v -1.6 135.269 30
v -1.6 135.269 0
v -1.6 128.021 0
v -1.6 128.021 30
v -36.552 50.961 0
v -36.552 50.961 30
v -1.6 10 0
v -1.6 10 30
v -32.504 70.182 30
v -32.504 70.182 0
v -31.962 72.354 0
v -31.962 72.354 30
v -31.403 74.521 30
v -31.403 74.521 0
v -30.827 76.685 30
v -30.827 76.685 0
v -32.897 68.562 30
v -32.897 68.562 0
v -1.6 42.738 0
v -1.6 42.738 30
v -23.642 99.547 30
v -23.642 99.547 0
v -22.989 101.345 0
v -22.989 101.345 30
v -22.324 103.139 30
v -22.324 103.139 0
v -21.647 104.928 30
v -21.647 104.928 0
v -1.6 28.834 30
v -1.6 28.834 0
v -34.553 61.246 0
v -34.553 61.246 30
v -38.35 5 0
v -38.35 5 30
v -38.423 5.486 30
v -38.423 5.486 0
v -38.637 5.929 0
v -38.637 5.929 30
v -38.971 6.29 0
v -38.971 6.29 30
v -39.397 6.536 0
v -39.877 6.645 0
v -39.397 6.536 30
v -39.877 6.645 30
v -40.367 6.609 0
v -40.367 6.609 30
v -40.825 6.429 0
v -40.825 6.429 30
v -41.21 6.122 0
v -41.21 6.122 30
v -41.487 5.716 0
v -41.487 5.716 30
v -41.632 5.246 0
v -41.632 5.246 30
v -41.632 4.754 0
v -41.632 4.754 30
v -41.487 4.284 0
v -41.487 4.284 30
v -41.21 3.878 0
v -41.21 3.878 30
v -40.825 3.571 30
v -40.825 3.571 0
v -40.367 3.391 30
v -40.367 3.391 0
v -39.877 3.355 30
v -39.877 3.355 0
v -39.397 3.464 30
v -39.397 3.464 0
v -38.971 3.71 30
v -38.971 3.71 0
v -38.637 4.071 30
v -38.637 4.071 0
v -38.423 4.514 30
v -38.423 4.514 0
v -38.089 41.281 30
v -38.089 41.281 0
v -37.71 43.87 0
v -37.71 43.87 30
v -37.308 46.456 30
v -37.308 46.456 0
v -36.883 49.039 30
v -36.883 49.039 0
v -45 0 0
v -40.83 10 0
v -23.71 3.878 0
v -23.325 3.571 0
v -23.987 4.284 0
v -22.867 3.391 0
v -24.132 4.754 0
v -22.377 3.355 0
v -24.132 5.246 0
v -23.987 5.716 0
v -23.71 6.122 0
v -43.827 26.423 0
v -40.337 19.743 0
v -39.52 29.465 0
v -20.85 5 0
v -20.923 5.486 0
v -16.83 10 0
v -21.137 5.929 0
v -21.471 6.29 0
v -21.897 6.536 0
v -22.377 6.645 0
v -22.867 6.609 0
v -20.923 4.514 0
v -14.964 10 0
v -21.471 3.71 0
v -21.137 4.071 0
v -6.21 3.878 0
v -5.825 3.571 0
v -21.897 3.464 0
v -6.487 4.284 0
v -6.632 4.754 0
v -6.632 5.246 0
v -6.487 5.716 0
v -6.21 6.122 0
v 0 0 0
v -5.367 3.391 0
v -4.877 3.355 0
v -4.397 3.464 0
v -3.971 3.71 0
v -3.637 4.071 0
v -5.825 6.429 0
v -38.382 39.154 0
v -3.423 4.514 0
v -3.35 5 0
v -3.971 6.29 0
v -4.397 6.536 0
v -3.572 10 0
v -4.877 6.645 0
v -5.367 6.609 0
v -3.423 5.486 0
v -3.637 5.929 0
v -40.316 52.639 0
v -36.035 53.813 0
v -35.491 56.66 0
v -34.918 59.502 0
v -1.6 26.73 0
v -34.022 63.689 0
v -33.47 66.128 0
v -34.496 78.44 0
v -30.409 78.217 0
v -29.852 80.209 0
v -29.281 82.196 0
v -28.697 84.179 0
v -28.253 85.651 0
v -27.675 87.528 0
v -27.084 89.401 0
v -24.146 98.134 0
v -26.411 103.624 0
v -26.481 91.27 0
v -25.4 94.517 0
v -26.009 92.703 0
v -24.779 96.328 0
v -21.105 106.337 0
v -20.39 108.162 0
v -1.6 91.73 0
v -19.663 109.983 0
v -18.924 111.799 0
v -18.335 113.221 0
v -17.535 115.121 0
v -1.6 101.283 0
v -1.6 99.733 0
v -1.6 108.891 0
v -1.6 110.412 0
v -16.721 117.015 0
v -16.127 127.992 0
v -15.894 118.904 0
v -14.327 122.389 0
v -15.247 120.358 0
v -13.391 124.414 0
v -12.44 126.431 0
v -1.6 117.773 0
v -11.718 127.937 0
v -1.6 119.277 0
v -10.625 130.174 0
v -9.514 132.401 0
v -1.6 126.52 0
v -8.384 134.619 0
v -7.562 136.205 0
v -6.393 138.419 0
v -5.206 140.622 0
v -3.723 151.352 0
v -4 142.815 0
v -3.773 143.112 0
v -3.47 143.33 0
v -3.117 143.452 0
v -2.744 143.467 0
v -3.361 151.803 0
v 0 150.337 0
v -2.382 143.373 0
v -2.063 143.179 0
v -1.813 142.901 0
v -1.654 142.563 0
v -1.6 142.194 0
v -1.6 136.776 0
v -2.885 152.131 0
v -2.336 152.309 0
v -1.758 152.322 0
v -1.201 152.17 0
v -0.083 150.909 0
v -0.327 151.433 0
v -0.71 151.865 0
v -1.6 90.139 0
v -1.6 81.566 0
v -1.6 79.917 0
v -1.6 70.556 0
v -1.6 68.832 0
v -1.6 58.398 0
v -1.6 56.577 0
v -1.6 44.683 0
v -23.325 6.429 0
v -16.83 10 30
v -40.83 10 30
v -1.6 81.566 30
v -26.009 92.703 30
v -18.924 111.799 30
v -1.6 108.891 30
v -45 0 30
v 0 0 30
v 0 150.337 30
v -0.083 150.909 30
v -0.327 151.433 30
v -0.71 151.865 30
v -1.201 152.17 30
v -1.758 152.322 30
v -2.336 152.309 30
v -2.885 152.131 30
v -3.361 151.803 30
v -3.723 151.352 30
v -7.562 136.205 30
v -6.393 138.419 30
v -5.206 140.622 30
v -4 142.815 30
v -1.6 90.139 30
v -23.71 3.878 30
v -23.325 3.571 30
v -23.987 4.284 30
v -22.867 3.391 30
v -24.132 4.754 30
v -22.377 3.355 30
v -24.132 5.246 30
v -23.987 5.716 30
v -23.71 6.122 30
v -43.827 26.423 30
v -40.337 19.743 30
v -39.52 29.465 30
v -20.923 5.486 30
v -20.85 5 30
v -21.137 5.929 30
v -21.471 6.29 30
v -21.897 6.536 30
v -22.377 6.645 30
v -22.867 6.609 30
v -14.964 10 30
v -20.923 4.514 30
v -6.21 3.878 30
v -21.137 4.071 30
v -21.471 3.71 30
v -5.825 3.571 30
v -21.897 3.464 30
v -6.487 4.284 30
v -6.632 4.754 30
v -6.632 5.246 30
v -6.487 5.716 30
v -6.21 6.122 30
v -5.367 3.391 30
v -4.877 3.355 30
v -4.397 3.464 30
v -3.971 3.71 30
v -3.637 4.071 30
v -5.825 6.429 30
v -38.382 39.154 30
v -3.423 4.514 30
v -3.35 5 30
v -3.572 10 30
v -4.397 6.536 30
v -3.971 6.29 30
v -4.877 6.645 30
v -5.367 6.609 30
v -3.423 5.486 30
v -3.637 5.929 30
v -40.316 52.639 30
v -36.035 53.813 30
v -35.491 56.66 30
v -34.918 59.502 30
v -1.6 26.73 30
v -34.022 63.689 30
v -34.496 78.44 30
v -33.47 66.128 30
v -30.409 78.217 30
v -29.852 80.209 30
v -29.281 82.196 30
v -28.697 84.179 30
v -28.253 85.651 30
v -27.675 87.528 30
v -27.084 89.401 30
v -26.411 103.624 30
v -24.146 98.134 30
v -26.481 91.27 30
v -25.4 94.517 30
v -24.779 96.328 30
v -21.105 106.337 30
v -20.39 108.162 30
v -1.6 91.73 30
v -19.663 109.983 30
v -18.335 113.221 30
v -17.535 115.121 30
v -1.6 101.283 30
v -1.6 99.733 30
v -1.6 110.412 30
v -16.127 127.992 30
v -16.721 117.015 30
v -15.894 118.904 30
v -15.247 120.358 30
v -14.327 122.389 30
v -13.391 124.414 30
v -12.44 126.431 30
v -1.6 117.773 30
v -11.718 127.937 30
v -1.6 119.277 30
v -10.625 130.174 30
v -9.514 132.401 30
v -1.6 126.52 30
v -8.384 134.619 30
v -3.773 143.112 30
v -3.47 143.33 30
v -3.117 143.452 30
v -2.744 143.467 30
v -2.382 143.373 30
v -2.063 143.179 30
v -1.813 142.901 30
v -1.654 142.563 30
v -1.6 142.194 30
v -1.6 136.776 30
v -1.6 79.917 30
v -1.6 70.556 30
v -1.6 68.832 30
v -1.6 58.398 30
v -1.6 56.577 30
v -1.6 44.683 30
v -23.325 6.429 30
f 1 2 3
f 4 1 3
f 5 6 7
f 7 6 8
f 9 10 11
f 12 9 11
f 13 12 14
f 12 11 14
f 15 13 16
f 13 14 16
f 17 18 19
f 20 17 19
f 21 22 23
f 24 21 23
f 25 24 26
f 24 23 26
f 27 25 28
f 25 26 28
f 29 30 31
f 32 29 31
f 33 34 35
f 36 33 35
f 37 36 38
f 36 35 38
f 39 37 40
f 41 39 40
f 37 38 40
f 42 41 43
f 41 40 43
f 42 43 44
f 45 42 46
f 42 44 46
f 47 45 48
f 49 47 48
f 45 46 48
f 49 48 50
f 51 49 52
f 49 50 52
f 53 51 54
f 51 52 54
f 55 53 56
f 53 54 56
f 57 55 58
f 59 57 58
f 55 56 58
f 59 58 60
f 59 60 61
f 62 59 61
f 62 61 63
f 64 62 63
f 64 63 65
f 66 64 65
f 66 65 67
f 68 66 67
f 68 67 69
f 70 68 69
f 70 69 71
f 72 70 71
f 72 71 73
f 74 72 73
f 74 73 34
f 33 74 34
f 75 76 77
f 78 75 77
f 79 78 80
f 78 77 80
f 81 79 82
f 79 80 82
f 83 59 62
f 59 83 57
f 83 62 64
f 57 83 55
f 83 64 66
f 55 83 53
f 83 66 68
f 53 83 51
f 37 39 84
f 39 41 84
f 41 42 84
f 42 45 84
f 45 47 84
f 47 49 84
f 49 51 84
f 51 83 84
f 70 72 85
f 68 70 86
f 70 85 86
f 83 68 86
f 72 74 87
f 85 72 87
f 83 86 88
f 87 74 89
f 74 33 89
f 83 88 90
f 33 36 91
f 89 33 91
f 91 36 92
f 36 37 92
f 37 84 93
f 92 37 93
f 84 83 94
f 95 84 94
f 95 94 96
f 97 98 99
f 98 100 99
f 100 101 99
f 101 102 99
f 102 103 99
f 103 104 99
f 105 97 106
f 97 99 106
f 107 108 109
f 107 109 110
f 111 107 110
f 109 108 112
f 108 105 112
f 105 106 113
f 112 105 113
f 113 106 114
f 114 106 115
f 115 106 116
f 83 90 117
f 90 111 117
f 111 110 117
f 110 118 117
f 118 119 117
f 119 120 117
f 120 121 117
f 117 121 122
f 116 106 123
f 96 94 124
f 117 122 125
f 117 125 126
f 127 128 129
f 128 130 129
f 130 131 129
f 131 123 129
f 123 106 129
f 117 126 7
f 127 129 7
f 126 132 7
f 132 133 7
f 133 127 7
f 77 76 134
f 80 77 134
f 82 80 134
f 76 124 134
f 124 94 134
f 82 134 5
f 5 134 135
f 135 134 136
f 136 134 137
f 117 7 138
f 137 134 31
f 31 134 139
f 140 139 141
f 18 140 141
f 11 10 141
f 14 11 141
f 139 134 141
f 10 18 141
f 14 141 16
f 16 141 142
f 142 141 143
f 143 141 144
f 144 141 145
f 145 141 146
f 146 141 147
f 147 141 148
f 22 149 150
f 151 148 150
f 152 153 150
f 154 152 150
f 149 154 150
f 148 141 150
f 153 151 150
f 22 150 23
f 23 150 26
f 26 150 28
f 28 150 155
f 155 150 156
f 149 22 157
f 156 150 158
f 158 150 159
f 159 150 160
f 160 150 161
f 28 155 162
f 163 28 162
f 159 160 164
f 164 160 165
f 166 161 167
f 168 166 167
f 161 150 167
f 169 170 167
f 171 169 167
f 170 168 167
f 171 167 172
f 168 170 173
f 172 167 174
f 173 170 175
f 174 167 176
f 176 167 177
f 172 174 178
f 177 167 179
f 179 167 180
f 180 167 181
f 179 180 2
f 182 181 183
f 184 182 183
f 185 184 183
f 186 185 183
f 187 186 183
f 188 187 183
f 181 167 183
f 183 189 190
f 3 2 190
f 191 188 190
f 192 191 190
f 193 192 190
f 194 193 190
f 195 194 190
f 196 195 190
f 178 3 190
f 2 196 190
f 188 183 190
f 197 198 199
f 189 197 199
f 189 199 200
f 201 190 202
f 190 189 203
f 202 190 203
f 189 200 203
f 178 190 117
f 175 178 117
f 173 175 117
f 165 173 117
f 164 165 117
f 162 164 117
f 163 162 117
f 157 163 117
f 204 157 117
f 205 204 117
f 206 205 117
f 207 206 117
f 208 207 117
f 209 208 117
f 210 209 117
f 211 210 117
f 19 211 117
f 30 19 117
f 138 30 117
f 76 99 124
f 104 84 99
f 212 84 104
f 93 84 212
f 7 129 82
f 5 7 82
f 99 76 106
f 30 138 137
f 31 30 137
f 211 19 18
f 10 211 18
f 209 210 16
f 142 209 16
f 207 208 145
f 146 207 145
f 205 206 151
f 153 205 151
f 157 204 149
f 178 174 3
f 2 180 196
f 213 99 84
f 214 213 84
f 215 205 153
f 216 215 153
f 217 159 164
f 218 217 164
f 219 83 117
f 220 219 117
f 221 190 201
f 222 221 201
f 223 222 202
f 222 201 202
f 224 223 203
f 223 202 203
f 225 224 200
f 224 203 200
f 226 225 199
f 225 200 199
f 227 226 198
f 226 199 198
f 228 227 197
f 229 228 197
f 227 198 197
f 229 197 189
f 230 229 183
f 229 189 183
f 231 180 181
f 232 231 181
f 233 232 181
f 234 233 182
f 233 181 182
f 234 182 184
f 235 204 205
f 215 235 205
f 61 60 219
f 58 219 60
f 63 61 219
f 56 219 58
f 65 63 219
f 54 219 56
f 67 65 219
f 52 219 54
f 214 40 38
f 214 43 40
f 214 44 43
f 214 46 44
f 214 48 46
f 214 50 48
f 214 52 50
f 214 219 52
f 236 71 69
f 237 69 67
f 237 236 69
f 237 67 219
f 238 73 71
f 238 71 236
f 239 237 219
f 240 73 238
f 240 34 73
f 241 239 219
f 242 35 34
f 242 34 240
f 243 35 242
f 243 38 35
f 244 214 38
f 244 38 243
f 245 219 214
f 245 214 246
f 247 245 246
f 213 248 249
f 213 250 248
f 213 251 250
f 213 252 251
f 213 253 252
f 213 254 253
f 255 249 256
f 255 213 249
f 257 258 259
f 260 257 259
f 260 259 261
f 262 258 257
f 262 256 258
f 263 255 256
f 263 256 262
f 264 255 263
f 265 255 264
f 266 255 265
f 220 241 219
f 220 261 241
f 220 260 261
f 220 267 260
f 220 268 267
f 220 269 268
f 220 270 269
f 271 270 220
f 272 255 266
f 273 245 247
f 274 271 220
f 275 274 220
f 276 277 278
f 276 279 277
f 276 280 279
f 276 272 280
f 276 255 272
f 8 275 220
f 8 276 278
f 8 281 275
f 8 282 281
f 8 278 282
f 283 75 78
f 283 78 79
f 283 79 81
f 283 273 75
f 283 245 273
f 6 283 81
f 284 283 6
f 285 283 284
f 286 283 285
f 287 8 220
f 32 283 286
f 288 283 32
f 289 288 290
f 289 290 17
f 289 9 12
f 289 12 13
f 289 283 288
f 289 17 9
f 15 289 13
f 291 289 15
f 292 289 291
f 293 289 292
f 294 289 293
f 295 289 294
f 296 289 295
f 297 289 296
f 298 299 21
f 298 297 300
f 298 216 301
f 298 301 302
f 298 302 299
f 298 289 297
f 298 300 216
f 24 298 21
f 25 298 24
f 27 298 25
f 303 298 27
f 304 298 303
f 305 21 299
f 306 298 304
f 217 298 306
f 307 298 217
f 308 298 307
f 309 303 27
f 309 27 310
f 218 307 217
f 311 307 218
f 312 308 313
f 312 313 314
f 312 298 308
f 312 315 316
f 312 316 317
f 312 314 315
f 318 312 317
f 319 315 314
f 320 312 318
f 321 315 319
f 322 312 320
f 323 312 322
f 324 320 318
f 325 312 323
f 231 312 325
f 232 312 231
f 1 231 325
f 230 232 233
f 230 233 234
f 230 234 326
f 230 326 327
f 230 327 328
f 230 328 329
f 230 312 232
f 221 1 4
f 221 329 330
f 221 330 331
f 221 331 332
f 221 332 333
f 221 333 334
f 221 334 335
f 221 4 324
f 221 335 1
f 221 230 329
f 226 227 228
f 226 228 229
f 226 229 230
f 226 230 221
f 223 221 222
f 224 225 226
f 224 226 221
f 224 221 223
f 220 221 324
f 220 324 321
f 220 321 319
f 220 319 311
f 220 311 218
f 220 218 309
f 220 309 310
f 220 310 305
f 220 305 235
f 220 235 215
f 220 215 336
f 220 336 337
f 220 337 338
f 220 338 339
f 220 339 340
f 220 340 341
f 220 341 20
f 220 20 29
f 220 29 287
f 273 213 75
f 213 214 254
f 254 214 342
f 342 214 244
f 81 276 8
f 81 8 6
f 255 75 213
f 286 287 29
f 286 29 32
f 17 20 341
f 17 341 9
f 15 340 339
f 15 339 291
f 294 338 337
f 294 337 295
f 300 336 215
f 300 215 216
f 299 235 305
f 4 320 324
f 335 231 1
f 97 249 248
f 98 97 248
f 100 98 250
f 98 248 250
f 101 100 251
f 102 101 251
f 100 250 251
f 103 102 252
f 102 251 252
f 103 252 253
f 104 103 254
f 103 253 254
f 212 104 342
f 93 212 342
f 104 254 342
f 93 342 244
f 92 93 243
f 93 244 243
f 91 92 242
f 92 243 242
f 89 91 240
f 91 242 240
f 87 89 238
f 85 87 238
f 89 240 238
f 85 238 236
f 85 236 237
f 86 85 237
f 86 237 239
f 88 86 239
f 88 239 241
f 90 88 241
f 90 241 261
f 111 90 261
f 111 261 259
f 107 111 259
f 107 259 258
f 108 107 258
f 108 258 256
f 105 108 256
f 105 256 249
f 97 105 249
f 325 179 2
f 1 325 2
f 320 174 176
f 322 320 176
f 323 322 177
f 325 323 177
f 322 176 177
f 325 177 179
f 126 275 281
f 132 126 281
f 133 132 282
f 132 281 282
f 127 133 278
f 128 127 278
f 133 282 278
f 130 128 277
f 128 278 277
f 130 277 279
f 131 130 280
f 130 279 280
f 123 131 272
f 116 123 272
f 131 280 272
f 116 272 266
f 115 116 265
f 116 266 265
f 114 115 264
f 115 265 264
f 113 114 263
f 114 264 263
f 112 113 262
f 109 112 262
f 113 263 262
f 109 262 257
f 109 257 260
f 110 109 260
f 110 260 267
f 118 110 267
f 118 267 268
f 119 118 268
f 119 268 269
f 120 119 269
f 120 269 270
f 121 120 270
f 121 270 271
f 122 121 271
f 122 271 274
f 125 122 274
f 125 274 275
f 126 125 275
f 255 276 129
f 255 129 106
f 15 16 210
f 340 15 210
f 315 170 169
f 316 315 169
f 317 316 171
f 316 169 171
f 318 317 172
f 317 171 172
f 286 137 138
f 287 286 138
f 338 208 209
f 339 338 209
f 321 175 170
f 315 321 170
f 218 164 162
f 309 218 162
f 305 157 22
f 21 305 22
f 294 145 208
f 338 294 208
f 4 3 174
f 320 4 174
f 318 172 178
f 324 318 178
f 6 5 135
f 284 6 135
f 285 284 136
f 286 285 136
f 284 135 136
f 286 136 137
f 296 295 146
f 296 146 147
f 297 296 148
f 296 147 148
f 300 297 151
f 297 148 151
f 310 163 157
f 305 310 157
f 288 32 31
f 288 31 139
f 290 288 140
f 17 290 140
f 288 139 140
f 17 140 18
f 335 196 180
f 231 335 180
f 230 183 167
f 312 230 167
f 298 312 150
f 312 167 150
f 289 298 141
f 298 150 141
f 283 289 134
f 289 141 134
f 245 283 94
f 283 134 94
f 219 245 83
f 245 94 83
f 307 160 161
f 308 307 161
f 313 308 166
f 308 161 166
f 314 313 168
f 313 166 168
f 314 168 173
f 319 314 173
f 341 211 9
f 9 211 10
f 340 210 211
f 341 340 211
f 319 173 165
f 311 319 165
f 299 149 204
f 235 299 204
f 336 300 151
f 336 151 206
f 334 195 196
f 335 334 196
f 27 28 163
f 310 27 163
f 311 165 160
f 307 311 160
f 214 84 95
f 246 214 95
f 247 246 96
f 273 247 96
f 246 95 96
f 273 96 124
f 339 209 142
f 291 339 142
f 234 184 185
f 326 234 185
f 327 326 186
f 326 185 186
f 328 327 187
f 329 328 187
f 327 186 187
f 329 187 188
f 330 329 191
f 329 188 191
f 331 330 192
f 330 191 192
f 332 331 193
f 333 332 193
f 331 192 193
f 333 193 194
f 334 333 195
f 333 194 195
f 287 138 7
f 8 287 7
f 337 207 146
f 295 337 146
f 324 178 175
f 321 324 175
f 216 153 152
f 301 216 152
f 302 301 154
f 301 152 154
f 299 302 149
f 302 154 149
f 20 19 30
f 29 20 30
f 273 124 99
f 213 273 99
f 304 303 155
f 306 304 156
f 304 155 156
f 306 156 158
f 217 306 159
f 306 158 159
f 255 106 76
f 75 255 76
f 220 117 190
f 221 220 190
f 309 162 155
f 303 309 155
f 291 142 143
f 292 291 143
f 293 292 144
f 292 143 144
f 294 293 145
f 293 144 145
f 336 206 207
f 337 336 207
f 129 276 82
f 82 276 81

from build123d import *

# Parameters (mm, degrees)
BOSS_EXTRUDE4_DEPTH = 30
SKETCH12_R          = 1.65
CUT_EXTRUDE1_DEPTH  = 162.652709488
BOSS_EXTRUDE5_DEPTH = 30
CIRPATTERN1_DEPTH   = 30
CUT_EXTRUDE2_START  = -30
CUT_EXTRUDE2_DEPTH  = 30


# Read off the part's stored shape, not the designer's step: CirPattern1
with BuildPart() as part:
    # Sketch5 → Boss-Extrude4 (new body)
    with BuildSketch(Plane.XY):
        with BuildLine():
            Line((0, 0), (0, 150.337121164))
            ThreePointArc((0, 150.337121164), (-1.473777529, 152.266652173), (-3.723089911, 151.352483739))
            ThreePointArc((-3.723089911, 151.352483739), (-34.4957159, 78.440037035), (-45, 0))
            Line((-45, 0), (0, 0))
        make_face()
        with BuildLine():
            Line((-1.6, 10), (-40.829955095, 10))
            ThreePointArc((-40.829955095, 10), (-30.304470107, 78.595490327), (-4, 142.815440342))
            ThreePointArc((-4, 142.815440342), (-2.559389376, 143.433276944), (-1.6, 142.193658833))
            Line((-1.6, 142.193658833), (-1.6, 10))
        make_face(mode=Mode.SUBTRACT)
    extrude(amount=BOSS_EXTRUDE4_DEPTH)

    # Sketch12 → Cut-Extrude1 (cut, through all)
    with BuildSketch(Plane.XY.offset(30)):
        with Locations((-40, 5)):
            Circle(SKETCH12_R)
        with Locations((-22.5, 5)):
            Circle(SKETCH12_R)
        with Locations((-5, 5)):
            Circle(SKETCH12_R)
    extrude(amount=-CUT_EXTRUDE1_DEPTH, mode=Mode.SUBTRACT)

    # Sketch13 → Boss-Extrude5 (add)
    with BuildSketch(Plane.XY.offset(30)):
        Polygon((-101.6, 127.193658833), (-1.6, 10), (-2.741055234, 9.026350704), (-102.741055234, 126.220009537), align=None)
    extrude(amount=-BOSS_EXTRUDE5_DEPTH)

    # CirPattern1 outline → CirPattern1 (add)
    with BuildSketch(Plane.XY):
        with BuildLine():
            Line((-101.6, 127.193658833), (-90.428627174, 114.101518276))
            Line((-90.428627174, 114.101518276), (-38.303740092, 62.831561128))
            ThreePointArc((-38.303740092, 62.831561128), (-38.115676892, 63.697596098), (-37.925040114, 64.563068197))
            Line((-37.925040114, 64.563068197), (-89.330082385, 115.124987119))
            Line((-89.330082385, 115.124987119), (-36.32594483, 71.390938936))
            ThreePointArc((-36.32594483, 71.390938936), (-36.125817446, 72.197508487), (-35.923442521, 73.003517048))
            Line((-35.923442521, 73.003517048), (-88.324919079, 116.240305842))
            Line((-88.324919079, 116.240305842), (-34.318662851, 79.086385123))
            ThreePointArc((-34.318662851, 79.086385123), (-34.107234191, 79.850856393), (-33.893772384, 80.614762447))
            Line((-33.893772384, 80.614762447), (-87.420787154, 117.438986195))
            Line((-87.420787154, 117.438986195), (-32.265940677, 86.200502345))
            ThreePointArc((-32.265940677, 86.200502345), (-32.04280883, 86.93581789), (-31.817782431, 87.670555864))
            Line((-31.817782431, 87.670555864), (-86.624567601, 118.711905496))
            Line((-86.624567601, 118.711905496), (-30.142720205, 92.940380431))
            ThreePointArc((-30.142720205, 92.940380431), (-29.906617894, 93.656921246), (-29.668703058, 94.372862284))
            Line((-29.668703058, 94.372862284), (-85.942320131, 120.049376062))
            Line((-85.942320131, 120.049376062), (-27.915909182, 99.471216899))
            ThreePointArc((-27.915909182, 99.471216899), (-27.664777337, 100.177924555), (-27.411868402, 100.883998196))
            Line((-27.411868402, 100.883998196), (-85.379237059, 121.441218934))
            Line((-85.379237059, 121.441218934), (-25.542932289, 105.93724151))
            ThreePointArc((-25.542932289, 105.93724151), (-25.273841569, 106.642396064), (-25.002966495, 107.346867111))
            Line((-25.002966495, 107.346867111), (-84.939603787, 122.876841346))
            Line((-84.939603787, 122.876841346), (-22.968102286, 112.477173218))
            ThreePointArc((-22.968102286, 112.477173218), (-22.677026174, 113.189036497), (-22.384114637, 113.900146519))
            Line((-22.384114637, 113.900146519), (-84.62676619, 124.345317346))
            Line((-84.62676619, 124.345317346), (-20.11610645, 119.238472696))
            ThreePointArc((-20.11610645, 119.238472696), (-19.797493538, 119.965945777), (-19.476943816, 120.692567512))
            Line((-19.476943816, 120.692567512), (-84.443105151, 125.835470945))
            Line((-84.443105151, 125.835470945), (-16.880634523, 126.394117549))
            ThreePointArc((-16.880634523, 126.394117549), (-16.526645472, 127.147574571), (-16.170553887, 127.900040194))
            Line((-16.170553887, 127.900040194), (-84.390018442, 127.335961174))
            Line((-84.390018442, 127.335961174), (-13.103676665, 134.167087417))
            ThreePointArc((-13.103676665, 134.167087417), (-12.702778891, 134.959651729), (-12.299521655, 135.751018152))
            Line((-12.299521655, 135.751018152), (-101.6, 127.193658833))
        make_face()
        with BuildLine():
            Line((-102.741055234, 126.220009537), (-101.6, 127.193658833))
            Line((-101.6, 127.193658833), (-102.806194023, 126.301977287))
            Line((-102.806194023, 126.301977287), (-41.773547865, 43.741994606))
            ThreePointArc((-41.773547865, 43.741994606), (-41.616374453, 44.788813456), (-41.455485097, 45.835067632))
            Line((-41.455485097, 45.835067632), (-88.817221598, 109.902159449))
            Line((-88.817221598, 109.902159449), (-102.741055234, 126.220009537))
        make_face()
        with BuildLine():
            ThreePointArc((-34.552670054, 61.246010298), (-34.736897582, 60.374196024), (-34.918483062, 59.501827625))
            Line((-34.918483062, 59.501827625), (-1.6, 26.729819964))
            Line((-1.6, 26.729819964), (-1.6, 28.833815738))
            Line((-1.6, 28.833815738), (-34.552670054, 61.246010298))
        make_face()
        with BuildLine():
            ThreePointArc((-32.504088687, 70.182186635), (-32.701856665, 69.372354972), (-32.897328567, 68.561966034))
            Line((-32.897328567, 68.561966034), (-1.6, 42.738342848))
            Line((-1.6, 42.738342848), (-1.6, 44.683028154))
            Line((-1.6, 44.683028154), (-32.504088687, 70.182186635))
        make_face()
        with BuildLine():
            ThreePointArc((-30.409038425, 78.217419283), (-30.619276495, 77.451282634), (-30.827444392, 76.684580908))
            Line((-30.827444392, 76.684580908), (-1.6, 56.57738912))
            Line((-1.6, 56.57738912), (-1.6, 58.398072333))
            Line((-1.6, 58.398072333), (-30.409038425, 78.217419283))
        make_face()
        with BuildLine():
            ThreePointArc((-28.252621221, 85.651327492), (-28.475582862, 84.915412953), (-28.696619797, 84.178918027))
            Line((-28.696619797, 84.178918027), (-1.6, 68.831992526))
            Line((-1.6, 68.831992526), (-1.6, 70.555872953))
            Line((-1.6, 70.555872953), (-28.252621221, 85.651327492))
        make_face()
        with BuildLine():
            ThreePointArc((-26.008808525, 92.702926401), (-26.245713404, 91.98652139), (-26.480779611, 91.269510972))
            Line((-26.480779611, 91.269510972), (-1.6, 79.916914254))
            Line((-1.6, 79.916914254), (-1.6, 81.565680547))
            Line((-1.6, 81.565680547), (-26.008808525, 92.702926401))
        make_face()
        with BuildLine():
            ThreePointArc((-23.641877477, 99.547029874), (-23.894816729, 98.840967037), (-24.145954739, 98.134261515))
            Line((-24.145954739, 98.134261515), (-1.6, 90.138691265))
            Line((-1.6, 90.138691265), (-1.6, 91.730222742))
            Line((-1.6, 91.730222742), (-23.641877477, 99.547029874))
        make_face()
        with BuildLine():
            ThreePointArc((-21.104819389, 106.336831732), (-21.376834174, 105.63265906), (-21.647040774, 104.92779057))
            Line((-21.647040774, 104.92779057), (-1.6, 99.733471356))
            Line((-1.6, 99.733471356), (-1.6, 101.283005621))
            Line((-1.6, 101.283005621), (-21.104819389, 106.336831732))
        make_face()
        with BuildLine():
            ThreePointArc((-18.335117992, 113.220669335), (-18.63044525, 112.509971124), (-18.923911862, 111.798502583))
            Line((-18.923911862, 111.798502583), (-1.6, 108.891312509))
            Line((-1.6, 108.891312509), (-1.6, 110.412286949))
            Line((-1.6, 110.412286949), (-18.335117992, 113.220669335))
        make_face()
        with BuildLine():
            ThreePointArc((-15.247010957, 120.35771417), (-15.571555811, 119.631419453), (-15.8941351, 118.90424961))
            Line((-15.8941351, 118.90424961), (-1.6, 117.772685809))
            Line((-1.6, 117.772685809), (-1.6, 119.27737853))
            Line((-1.6, 119.27737853), (-15.247010957, 120.35771417))
        make_face()
        with BuildLine():
            ThreePointArc((-11.717737877, 127.936858719), (-12.079928782, 127.184359789), (-12.439981613, 126.430835503))
            Line((-12.439981613, 126.430835503), (-1.6, 126.520466904))
            Line((-1.6, 126.520466904), (-1.6, 128.020518181))
            Line((-1.6, 128.020518181), (-11.717737877, 127.936858719))
        make_face()
        with BuildLine():
            ThreePointArc((-7.562004039, 136.204998257), (-7.974393837, 135.412784341), (-8.384376146, 134.61932184))
            Line((-8.384376146, 134.61932184), (-1.6, 135.269445395))
            Line((-1.6, 135.269445395), (-1.6, 136.776316706))
            Line((-1.6, 136.776316706), (-7.562004039, 136.204998257))
        make_face()
        Polygon((0, 27.260058248), (0, 25.156062475), (7.181716143, 18.092137745), (8.23357019, 19.161531528), align=None)
        Polygon((0, 136.929639232), (0, 135.422767921), (51.900153262, 140.396182044), (51.757068846, 141.889342065), align=None)
        Polygon((0, 128.03374793), (0, 126.533696654), (52.466714553, 126.967522588), (52.454312086, 128.467471313), align=None)
        Polygon((0, 119.150718045), (0, 117.646025324), (51.860735117, 113.540584165), (51.979108991, 115.035906079), align=None)
        Polygon((0, 110.143784999), (0, 108.622810558), (50.086826826, 100.217553884), (50.335076143, 101.696868684), align=None)
        Polygon((0, 100.868435169), (0, 99.318900904), (47.158490191, 87.099828051), (47.534725625, 88.551877257), align=None)
        Polygon((0, 91.162807764), (0, 89.571276287), (43.098011623, 74.287240479), (43.599369795, 75.700973121), align=None)
        Polygon((0, 80.835632895), (0, 79.186866601), (37.936293815, 61.877302697), (38.558959087, 63.241959415), align=None)
        Polygon((0, 69.649668379), (0, 67.925787952), (31.712620558, 49.964461824), (32.451854069, 51.269656757), align=None)
        Polygon((0, 57.297342949), (0, 55.476659736), (24.474357761, 38.639381772), (25.3245335, 39.875181599), align=None)
        Polygon((0, 43.362858063), (0, 41.418172757), (16.276592976, 27.988253239), (17.231240592, 29.145252777), align=None)
        with BuildLine():
            Line((-16.829705211, 10), (-14.964333673, 10))
            Line((-14.964333673, 10), (-38.088693922, 41.280747301))
            ThreePointArc((-38.088693922, 41.280747301), (-38.23738412, 40.217865998), (-38.382194992, 39.154449216))
            Line((-38.382194992, 39.154449216), (-16.829705211, 10))
        make_face()
    extrude(amount=CIRPATTERN1_DEPTH)

    # Sketch14 → Cut-Extrude2 (cut)
    with BuildSketch(Plane.XY.offset(30).offset(CUT_EXTRUDE2_START)):
        Polygon((-129.094046134, -17.289617226), (770.905953866, -20.358672888), (773.974831033, 879.588983489), (-141.374926706, 882.710382774), align=None)
        with BuildLine():
            Line((-45, 0), (0, 0))
            Line((0, 0), (0, 150.337121164))
            ThreePointArc((0, 150.337121164), (-1.473777529, 152.266652173), (-3.723089911, 151.352483739))
            ThreePointArc((-3.723089911, 151.352483739), (-34.4957159, 78.440037035), (-45, 0))
        make_face(mode=Mode.SUBTRACT)
    extrude(amount=CUT_EXTRUDE2_DEPTH, mode=Mode.SUBTRACT)


solid = part.part
